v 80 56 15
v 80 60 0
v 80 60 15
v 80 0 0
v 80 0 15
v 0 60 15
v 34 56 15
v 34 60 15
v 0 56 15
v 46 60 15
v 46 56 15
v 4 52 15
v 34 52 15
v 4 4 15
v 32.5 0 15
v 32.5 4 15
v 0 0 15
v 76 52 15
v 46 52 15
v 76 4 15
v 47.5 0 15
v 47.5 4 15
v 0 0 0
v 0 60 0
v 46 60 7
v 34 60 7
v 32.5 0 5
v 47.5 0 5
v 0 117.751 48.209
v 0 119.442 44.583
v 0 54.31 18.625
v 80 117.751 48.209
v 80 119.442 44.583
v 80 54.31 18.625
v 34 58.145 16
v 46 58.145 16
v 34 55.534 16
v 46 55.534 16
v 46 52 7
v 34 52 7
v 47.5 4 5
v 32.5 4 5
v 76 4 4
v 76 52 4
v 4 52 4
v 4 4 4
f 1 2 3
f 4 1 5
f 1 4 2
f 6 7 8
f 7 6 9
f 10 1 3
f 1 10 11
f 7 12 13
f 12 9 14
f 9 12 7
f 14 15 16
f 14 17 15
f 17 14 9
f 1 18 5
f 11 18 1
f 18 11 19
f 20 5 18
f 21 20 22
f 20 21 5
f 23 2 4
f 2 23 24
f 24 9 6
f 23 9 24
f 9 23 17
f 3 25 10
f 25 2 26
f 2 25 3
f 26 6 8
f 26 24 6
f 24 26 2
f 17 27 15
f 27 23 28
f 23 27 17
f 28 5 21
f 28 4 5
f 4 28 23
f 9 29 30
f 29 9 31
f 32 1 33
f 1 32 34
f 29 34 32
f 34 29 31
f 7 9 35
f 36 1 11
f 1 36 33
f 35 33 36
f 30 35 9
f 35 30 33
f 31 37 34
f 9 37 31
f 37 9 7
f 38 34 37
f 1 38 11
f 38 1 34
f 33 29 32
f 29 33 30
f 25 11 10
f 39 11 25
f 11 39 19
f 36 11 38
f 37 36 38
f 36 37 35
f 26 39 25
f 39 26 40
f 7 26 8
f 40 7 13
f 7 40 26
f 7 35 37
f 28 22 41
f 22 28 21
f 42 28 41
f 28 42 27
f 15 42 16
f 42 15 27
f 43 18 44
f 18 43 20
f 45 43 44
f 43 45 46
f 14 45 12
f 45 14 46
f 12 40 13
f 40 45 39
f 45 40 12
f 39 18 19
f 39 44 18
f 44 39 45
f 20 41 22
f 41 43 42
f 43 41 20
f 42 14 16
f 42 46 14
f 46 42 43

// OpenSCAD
// Parametric phone/tablet stand with adjustable angle
// Includes cable routing slot

stand_width = 80;
stand_depth = 60;
stand_height = 15;
back_height = 70;
viewing_angle = 65;  // Angle from horizontal
phone_slot_width = 12;
phone_slot_depth = 8;
cable_slot_width = 15;
cable_slot_height = 10;
wall_thickness = 4;

module phone_stand() {
    difference() {
        union() {
            // Base
            cube([stand_width, stand_depth, stand_height]);
            
            // Back support angled
            translate([0, stand_depth - wall_thickness, stand_height])
            rotate([90 - viewing_angle, 0, 0])
            cube([stand_width, back_height, wall_thickness]);
        }
        
        // Phone slot
        translate([(stand_width - phone_slot_width)/2, wall_thickness, stand_height - phone_slot_depth])
        cube([phone_slot_width, stand_depth, phone_slot_depth + 1]);
        
        // Cable routing slot
        translate([(stand_width - cable_slot_width)/2, -1, stand_height - cable_slot_height])
        cube([cable_slot_width, wall_thickness + 2, cable_slot_height + 1]);
        
        // Weight reduction cutout in base
        translate([wall_thickness, wall_thickness, wall_thickness])
        cube([
            stand_width - 2*wall_thickness,
            stand_depth - 3*wall_thickness,
            stand_height
        ]);
    }
}

phone_stand();
